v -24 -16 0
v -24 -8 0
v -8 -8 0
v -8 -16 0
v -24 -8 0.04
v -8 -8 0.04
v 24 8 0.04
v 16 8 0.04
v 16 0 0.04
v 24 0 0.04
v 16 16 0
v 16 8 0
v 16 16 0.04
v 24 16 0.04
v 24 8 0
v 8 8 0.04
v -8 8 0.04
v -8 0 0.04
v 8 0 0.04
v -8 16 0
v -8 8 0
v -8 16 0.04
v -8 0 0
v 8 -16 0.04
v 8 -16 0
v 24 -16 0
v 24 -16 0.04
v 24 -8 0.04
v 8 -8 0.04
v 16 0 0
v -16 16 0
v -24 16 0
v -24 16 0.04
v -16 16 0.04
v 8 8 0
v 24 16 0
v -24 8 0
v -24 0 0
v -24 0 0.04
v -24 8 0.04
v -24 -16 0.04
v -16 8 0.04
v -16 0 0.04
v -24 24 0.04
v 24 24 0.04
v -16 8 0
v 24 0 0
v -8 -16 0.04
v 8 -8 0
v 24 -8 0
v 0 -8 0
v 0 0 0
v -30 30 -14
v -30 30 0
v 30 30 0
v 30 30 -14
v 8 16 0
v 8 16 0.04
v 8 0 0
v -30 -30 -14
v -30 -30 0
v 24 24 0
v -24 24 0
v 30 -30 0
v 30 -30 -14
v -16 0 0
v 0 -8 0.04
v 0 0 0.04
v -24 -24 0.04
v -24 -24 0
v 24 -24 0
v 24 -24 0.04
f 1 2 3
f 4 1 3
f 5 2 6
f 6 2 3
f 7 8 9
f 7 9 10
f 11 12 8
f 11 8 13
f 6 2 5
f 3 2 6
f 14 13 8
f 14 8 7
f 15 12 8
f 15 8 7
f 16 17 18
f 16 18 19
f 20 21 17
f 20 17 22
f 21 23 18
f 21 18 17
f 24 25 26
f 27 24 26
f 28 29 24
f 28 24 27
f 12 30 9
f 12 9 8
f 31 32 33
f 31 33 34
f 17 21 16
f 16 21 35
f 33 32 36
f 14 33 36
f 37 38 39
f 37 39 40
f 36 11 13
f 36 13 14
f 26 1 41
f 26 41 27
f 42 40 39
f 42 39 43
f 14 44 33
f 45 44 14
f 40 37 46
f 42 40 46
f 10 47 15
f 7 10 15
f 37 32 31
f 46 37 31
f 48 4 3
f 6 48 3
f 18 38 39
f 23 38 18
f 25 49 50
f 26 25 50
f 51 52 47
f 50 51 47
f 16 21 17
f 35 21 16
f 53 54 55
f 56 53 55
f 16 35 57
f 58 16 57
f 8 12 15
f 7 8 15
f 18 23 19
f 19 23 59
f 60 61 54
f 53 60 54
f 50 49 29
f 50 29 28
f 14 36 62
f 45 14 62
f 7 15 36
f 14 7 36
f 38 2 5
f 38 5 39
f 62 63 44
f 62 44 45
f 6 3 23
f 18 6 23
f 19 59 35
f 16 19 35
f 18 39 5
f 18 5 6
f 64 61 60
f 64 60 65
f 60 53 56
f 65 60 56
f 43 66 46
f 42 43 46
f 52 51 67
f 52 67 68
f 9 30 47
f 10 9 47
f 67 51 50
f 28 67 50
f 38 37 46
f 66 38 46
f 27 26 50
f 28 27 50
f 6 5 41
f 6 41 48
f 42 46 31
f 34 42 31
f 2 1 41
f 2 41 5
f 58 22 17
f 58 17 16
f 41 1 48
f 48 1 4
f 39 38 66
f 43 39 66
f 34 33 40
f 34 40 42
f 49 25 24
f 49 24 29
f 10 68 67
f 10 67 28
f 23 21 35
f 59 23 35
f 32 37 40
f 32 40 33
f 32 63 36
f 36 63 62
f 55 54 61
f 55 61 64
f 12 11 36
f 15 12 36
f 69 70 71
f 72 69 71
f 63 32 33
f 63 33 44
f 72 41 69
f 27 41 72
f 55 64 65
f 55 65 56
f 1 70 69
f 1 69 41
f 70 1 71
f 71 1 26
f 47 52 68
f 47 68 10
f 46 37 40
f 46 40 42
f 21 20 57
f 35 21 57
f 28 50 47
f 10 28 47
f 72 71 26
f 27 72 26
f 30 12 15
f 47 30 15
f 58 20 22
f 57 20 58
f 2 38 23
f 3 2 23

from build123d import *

# Parameters (mm, degrees)
SKETCH_1_W                     = 60
SKETCH_1_H                     = 60
COPLANAR_SUPPORT60X60X14_DEPTH = 14
SKETCH_2_W                     = 48
SKETCH_2_H                     = 8
ID3_ROW0_DEPTH                 = 0.04
SKETCH_3_W                     = 8
SKETCH_3_H                     = 8
ID3_ROW1_DEPTH                 = 0.04
SKETCH_3_W_2                   = 16
ID3_ROW1_2_DEPTH               = 0.04
ID3_ROW1_3_DEPTH               = 0.04
SKETCH_4_W                     = 8
SKETCH_4_H                     = 8
ID3_ROW2_DEPTH                 = 0.04
SKETCH_4_W_2                   = 16
ID3_ROW2_2_DEPTH               = 0.04
ID3_ROW2_3_DEPTH               = 0.04
SKETCH_5_W                     = 16
SKETCH_5_H                     = 8
ID3_ROW3_DEPTH                 = 0.04
SKETCH_5_W_2                   = 24
ID3_ROW3_2_DEPTH               = 0.04
SKETCH_6_W                     = 16
SKETCH_6_H                     = 8
ID3_ROW4_DEPTH                 = 0.04
ID3_ROW4_2_DEPTH               = 0.04
SKETCH_7_W                     = 48
SKETCH_7_H                     = 8
ID3_ROW5_DEPTH                 = 0.04


with BuildPart() as part:
    # 草图1 → Coplanar_support60x60x14 (new body)
    with BuildSketch(Plane.XY):
        Rectangle(SKETCH_1_W, SKETCH_1_H)
    extrude(amount=-COPLANAR_SUPPORT60X60X14_DEPTH)


with BuildPart() as body_2:
    # 草图2 → ID3_row0 (new body)
    with BuildSketch(Plane.XY):
        with Locations((0, 20)):
            Rectangle(SKETCH_2_W, SKETCH_2_H)
    extrude(amount=ID3_ROW0_DEPTH)


with BuildPart() as body_3:
    # 草图3 → ID3_row1 (new body)
    with BuildSketch(Plane.XY):
        with Locations((-20, 12)):
            Rectangle(SKETCH_3_W, SKETCH_3_H)
    extrude(amount=ID3_ROW1_DEPTH)


with BuildPart() as body_4:
    # 草图3 → ID3_row1 2 (new body)
    with BuildSketch(Plane.XY):
        with Locations((0, 12)):
            Rectangle(SKETCH_3_W_2, SKETCH_3_H)
    extrude(amount=ID3_ROW1_2_DEPTH)


with BuildPart() as body_5:
    # 草图3 → ID3_row1 3 (new body)
    with BuildSketch(Plane.XY):
        with Locations((20, 12)):
            Rectangle(SKETCH_3_W, SKETCH_3_H)
    extrude(amount=ID3_ROW1_3_DEPTH)


with BuildPart() as body_6:
    # 草图4 → ID3_row2 (new body)
    with BuildSketch(Plane.XY):
        with Locations((-20, 4)):
            Rectangle(SKETCH_4_W, SKETCH_4_H)
    extrude(amount=ID3_ROW2_DEPTH)


with BuildPart() as body_7:
    # 草图4 → ID3_row2 2 (new body)
    with BuildSketch(Plane.XY):
        with Locations((0, 4)):
            Rectangle(SKETCH_4_W_2, SKETCH_4_H)
    extrude(amount=ID3_ROW2_2_DEPTH)


with BuildPart() as body_8:
    # 草图4 → ID3_row2 3 (new body)
    with BuildSketch(Plane.XY):
        with Locations((20, 4)):
            Rectangle(SKETCH_4_W, SKETCH_4_H)
    extrude(amount=ID3_ROW2_3_DEPTH)


with BuildPart() as body_9:
    # 草图5 → ID3_row3 (new body)
    with BuildSketch(Plane.XY):
        with Locations((-16, -4)):
            Rectangle(SKETCH_5_W, SKETCH_5_H)
    extrude(amount=ID3_ROW3_DEPTH)


with BuildPart() as body_10:
    # 草图5 → ID3_row3 2 (new body)
    with BuildSketch(Plane.XY):
        with Locations((12, -4)):
            Rectangle(SKETCH_5_W_2, SKETCH_5_H)
    extrude(amount=ID3_ROW3_2_DEPTH)


with BuildPart() as body_11:
    # 草图6 → ID3_row4 (new body)
    with BuildSketch(Plane.XY):
        with Locations((-16, -12)):
            Rectangle(SKETCH_6_W, SKETCH_6_H)
    extrude(amount=ID3_ROW4_DEPTH)


with BuildPart() as body_12:
    # 草图6 → ID3_row4 2 (new body)
    with BuildSketch(Plane.XY):
        with Locations((16, -12)):
            Rectangle(SKETCH_6_W, SKETCH_6_H)
    extrude(amount=ID3_ROW4_2_DEPTH)


with BuildPart() as body_13:
    # 草图7 → ID3_row5 (new body)
    with BuildSketch(Plane.XY):
        with Locations((0, -20)):
            Rectangle(SKETCH_7_W, SKETCH_7_H)
    extrude(amount=ID3_ROW5_DEPTH)


solid = Compound([part.part, body_2.part, body_3.part, body_4.part, body_5.part, body_6.part, body_7.part, body_8.part, body_9.part, body_10.part, body_11.part, body_12.part, body_13.part])
